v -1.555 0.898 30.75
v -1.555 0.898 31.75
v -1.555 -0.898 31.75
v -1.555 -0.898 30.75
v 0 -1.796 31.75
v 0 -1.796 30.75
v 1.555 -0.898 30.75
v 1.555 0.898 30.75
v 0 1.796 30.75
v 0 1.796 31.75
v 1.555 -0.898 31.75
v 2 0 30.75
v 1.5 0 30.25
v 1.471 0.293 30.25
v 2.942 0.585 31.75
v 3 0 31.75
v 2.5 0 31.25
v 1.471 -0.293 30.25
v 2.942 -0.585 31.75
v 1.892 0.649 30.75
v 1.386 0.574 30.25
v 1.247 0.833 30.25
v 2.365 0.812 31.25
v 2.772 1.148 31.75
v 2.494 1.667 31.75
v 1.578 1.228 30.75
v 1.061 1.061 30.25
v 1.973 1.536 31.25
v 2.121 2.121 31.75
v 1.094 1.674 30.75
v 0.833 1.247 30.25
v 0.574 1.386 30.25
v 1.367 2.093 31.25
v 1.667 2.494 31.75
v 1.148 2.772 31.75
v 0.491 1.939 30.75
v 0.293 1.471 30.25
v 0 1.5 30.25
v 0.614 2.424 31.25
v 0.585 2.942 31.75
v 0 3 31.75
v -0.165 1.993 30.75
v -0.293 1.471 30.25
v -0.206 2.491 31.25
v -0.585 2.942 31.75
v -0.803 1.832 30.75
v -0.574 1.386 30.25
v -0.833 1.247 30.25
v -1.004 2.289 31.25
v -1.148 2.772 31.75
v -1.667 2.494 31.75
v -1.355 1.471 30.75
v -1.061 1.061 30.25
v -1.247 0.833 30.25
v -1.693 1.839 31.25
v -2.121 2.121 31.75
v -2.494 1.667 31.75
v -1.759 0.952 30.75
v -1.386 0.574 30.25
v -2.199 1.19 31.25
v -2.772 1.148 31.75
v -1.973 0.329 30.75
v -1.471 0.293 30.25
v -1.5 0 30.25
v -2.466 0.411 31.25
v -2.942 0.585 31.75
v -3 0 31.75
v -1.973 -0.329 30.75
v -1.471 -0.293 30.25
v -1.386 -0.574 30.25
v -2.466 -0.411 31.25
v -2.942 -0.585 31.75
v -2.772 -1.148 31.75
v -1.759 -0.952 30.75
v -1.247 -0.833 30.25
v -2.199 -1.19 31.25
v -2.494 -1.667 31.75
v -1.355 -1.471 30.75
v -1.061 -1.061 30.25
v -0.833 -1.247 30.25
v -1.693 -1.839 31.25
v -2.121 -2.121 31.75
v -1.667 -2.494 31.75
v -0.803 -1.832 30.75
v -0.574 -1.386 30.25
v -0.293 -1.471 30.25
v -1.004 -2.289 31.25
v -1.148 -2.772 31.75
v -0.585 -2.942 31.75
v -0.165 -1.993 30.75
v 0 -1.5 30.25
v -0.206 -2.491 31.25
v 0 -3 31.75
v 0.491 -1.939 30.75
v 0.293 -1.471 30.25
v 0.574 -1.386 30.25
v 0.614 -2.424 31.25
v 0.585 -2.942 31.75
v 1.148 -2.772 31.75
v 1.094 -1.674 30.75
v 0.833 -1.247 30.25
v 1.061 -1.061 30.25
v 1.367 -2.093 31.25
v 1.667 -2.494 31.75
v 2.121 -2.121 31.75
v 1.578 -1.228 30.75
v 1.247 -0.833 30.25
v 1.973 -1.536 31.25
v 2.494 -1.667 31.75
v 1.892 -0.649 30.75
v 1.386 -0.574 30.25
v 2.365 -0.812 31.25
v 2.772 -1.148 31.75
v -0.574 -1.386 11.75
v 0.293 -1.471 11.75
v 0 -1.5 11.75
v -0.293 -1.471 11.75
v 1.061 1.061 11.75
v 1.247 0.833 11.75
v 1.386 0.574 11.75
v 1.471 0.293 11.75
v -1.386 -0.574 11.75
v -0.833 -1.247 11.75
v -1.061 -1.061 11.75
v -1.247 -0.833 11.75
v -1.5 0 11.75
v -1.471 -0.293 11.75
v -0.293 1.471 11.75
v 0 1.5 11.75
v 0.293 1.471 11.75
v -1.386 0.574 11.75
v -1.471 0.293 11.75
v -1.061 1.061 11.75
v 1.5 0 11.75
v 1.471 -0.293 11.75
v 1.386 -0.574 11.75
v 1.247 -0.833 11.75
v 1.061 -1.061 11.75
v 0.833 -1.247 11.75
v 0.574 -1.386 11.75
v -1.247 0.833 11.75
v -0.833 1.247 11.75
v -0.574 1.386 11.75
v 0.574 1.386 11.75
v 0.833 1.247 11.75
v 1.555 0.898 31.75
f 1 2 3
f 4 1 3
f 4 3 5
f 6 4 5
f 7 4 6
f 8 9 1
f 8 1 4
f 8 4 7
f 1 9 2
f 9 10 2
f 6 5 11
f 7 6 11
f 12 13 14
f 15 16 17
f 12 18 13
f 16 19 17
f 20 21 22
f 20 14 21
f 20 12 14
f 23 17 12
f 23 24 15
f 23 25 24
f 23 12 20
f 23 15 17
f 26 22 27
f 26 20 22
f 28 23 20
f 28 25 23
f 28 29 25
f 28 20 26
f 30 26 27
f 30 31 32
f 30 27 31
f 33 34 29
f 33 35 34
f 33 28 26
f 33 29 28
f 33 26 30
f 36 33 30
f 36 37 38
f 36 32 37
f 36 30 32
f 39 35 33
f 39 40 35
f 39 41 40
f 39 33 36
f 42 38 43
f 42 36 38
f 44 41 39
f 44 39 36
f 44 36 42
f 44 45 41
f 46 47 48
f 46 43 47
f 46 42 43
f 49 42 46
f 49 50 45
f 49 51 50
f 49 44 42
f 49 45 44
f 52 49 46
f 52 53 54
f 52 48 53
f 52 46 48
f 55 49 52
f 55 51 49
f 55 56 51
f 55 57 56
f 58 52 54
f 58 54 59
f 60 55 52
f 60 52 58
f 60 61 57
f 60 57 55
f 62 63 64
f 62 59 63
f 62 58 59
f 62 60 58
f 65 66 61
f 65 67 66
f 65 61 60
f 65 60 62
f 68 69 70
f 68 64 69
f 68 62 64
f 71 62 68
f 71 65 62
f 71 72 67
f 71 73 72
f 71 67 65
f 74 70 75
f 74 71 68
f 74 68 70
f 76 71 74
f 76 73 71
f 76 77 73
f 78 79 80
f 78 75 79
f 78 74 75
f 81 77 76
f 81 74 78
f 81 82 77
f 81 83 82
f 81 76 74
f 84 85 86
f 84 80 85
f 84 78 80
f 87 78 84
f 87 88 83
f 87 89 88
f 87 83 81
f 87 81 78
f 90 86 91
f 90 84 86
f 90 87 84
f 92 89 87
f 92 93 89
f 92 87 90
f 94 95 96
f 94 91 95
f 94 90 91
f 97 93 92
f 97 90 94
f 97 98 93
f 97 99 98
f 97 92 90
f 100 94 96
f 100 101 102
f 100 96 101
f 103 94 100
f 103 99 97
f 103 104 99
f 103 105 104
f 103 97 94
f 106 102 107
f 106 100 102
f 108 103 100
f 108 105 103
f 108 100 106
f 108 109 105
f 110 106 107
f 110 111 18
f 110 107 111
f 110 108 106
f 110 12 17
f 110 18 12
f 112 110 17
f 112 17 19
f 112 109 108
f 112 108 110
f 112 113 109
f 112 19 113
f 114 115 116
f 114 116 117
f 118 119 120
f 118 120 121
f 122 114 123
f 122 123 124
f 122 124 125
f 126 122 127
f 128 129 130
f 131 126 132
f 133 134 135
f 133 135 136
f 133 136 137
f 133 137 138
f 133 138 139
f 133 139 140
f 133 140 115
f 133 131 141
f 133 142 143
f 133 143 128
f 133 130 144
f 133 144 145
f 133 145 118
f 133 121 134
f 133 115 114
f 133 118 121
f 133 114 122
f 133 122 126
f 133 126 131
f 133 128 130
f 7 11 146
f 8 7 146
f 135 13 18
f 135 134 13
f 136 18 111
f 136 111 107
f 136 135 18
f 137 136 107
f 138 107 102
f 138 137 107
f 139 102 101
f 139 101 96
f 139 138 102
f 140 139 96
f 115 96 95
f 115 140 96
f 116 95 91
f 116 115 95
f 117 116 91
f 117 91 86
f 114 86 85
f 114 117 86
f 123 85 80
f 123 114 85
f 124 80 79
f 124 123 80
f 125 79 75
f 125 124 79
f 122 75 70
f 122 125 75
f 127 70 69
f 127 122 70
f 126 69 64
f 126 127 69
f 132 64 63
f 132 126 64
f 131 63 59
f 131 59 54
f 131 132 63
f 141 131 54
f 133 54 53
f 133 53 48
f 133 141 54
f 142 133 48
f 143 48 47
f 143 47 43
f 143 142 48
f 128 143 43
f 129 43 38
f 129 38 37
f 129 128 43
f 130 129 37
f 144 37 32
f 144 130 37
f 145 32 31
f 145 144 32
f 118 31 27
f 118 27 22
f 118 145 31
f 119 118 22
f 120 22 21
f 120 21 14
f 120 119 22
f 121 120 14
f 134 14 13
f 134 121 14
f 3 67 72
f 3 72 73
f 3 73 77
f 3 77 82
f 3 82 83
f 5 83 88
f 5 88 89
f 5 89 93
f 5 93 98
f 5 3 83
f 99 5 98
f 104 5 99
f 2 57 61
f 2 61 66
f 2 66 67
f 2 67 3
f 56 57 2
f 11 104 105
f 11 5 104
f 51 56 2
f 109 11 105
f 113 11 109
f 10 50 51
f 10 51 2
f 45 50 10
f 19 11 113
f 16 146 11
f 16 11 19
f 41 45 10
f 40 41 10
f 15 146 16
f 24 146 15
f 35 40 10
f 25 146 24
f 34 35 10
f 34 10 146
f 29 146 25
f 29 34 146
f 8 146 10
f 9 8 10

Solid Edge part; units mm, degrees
sketch "Sketch1" plane through (0, 0, 0) normal (0, 0, 1) x (1, 0, 0)
  circle A0 centre (0, 0) radius 1.5
extrude "Protrusion1" add sketch "Sketch1" along normal blind 30
sketch "Sketch2" plane through (0, 0, 30) normal (0, 0, 1) x (1, 0, 0)
  circle A0 centre (0, 0) radius 3
extrude "ExtrudedProtrusion_2" add sketch "Sketch2" along normal blind 1.75
chamfer "Chamfer_1" distance 1.75 angle 45 1 edges at (-3, 0, 30)
sketch "Sketch3" plane through (0, 0, 31.75) normal (0, 0, 1) x (0, 1, 0)
  line L0 (0.8978, -1.555) -> (1.7956, 0)
  line L1 (1.7956, 0) -> (0.8978, 1.555)
  line L2 (0.8978, 1.555) -> (-0.8978, 1.555)
  line L3 (-0.8978, 1.555) -> (-1.7956, 0)
  line L4 (-1.7956, 0) -> (-0.8978, -1.555)
  line L5 (-0.8978, -1.555) -> (0.8978, -1.555)
extrude "ExtrudedCutout_1" cut sketch "Sketch3" against normal blind 1
sketch "Sketch4" plane through (0, 0, 0) normal (0, 0, -1) x (0, 1, 0)
  circle A0 centre (0, 0) radius 1.9215
extrude "ExtrudedCutout_2" cut sketch "Sketch4" against normal blind 11.75
properties material "Iron, grey cast type 20"
